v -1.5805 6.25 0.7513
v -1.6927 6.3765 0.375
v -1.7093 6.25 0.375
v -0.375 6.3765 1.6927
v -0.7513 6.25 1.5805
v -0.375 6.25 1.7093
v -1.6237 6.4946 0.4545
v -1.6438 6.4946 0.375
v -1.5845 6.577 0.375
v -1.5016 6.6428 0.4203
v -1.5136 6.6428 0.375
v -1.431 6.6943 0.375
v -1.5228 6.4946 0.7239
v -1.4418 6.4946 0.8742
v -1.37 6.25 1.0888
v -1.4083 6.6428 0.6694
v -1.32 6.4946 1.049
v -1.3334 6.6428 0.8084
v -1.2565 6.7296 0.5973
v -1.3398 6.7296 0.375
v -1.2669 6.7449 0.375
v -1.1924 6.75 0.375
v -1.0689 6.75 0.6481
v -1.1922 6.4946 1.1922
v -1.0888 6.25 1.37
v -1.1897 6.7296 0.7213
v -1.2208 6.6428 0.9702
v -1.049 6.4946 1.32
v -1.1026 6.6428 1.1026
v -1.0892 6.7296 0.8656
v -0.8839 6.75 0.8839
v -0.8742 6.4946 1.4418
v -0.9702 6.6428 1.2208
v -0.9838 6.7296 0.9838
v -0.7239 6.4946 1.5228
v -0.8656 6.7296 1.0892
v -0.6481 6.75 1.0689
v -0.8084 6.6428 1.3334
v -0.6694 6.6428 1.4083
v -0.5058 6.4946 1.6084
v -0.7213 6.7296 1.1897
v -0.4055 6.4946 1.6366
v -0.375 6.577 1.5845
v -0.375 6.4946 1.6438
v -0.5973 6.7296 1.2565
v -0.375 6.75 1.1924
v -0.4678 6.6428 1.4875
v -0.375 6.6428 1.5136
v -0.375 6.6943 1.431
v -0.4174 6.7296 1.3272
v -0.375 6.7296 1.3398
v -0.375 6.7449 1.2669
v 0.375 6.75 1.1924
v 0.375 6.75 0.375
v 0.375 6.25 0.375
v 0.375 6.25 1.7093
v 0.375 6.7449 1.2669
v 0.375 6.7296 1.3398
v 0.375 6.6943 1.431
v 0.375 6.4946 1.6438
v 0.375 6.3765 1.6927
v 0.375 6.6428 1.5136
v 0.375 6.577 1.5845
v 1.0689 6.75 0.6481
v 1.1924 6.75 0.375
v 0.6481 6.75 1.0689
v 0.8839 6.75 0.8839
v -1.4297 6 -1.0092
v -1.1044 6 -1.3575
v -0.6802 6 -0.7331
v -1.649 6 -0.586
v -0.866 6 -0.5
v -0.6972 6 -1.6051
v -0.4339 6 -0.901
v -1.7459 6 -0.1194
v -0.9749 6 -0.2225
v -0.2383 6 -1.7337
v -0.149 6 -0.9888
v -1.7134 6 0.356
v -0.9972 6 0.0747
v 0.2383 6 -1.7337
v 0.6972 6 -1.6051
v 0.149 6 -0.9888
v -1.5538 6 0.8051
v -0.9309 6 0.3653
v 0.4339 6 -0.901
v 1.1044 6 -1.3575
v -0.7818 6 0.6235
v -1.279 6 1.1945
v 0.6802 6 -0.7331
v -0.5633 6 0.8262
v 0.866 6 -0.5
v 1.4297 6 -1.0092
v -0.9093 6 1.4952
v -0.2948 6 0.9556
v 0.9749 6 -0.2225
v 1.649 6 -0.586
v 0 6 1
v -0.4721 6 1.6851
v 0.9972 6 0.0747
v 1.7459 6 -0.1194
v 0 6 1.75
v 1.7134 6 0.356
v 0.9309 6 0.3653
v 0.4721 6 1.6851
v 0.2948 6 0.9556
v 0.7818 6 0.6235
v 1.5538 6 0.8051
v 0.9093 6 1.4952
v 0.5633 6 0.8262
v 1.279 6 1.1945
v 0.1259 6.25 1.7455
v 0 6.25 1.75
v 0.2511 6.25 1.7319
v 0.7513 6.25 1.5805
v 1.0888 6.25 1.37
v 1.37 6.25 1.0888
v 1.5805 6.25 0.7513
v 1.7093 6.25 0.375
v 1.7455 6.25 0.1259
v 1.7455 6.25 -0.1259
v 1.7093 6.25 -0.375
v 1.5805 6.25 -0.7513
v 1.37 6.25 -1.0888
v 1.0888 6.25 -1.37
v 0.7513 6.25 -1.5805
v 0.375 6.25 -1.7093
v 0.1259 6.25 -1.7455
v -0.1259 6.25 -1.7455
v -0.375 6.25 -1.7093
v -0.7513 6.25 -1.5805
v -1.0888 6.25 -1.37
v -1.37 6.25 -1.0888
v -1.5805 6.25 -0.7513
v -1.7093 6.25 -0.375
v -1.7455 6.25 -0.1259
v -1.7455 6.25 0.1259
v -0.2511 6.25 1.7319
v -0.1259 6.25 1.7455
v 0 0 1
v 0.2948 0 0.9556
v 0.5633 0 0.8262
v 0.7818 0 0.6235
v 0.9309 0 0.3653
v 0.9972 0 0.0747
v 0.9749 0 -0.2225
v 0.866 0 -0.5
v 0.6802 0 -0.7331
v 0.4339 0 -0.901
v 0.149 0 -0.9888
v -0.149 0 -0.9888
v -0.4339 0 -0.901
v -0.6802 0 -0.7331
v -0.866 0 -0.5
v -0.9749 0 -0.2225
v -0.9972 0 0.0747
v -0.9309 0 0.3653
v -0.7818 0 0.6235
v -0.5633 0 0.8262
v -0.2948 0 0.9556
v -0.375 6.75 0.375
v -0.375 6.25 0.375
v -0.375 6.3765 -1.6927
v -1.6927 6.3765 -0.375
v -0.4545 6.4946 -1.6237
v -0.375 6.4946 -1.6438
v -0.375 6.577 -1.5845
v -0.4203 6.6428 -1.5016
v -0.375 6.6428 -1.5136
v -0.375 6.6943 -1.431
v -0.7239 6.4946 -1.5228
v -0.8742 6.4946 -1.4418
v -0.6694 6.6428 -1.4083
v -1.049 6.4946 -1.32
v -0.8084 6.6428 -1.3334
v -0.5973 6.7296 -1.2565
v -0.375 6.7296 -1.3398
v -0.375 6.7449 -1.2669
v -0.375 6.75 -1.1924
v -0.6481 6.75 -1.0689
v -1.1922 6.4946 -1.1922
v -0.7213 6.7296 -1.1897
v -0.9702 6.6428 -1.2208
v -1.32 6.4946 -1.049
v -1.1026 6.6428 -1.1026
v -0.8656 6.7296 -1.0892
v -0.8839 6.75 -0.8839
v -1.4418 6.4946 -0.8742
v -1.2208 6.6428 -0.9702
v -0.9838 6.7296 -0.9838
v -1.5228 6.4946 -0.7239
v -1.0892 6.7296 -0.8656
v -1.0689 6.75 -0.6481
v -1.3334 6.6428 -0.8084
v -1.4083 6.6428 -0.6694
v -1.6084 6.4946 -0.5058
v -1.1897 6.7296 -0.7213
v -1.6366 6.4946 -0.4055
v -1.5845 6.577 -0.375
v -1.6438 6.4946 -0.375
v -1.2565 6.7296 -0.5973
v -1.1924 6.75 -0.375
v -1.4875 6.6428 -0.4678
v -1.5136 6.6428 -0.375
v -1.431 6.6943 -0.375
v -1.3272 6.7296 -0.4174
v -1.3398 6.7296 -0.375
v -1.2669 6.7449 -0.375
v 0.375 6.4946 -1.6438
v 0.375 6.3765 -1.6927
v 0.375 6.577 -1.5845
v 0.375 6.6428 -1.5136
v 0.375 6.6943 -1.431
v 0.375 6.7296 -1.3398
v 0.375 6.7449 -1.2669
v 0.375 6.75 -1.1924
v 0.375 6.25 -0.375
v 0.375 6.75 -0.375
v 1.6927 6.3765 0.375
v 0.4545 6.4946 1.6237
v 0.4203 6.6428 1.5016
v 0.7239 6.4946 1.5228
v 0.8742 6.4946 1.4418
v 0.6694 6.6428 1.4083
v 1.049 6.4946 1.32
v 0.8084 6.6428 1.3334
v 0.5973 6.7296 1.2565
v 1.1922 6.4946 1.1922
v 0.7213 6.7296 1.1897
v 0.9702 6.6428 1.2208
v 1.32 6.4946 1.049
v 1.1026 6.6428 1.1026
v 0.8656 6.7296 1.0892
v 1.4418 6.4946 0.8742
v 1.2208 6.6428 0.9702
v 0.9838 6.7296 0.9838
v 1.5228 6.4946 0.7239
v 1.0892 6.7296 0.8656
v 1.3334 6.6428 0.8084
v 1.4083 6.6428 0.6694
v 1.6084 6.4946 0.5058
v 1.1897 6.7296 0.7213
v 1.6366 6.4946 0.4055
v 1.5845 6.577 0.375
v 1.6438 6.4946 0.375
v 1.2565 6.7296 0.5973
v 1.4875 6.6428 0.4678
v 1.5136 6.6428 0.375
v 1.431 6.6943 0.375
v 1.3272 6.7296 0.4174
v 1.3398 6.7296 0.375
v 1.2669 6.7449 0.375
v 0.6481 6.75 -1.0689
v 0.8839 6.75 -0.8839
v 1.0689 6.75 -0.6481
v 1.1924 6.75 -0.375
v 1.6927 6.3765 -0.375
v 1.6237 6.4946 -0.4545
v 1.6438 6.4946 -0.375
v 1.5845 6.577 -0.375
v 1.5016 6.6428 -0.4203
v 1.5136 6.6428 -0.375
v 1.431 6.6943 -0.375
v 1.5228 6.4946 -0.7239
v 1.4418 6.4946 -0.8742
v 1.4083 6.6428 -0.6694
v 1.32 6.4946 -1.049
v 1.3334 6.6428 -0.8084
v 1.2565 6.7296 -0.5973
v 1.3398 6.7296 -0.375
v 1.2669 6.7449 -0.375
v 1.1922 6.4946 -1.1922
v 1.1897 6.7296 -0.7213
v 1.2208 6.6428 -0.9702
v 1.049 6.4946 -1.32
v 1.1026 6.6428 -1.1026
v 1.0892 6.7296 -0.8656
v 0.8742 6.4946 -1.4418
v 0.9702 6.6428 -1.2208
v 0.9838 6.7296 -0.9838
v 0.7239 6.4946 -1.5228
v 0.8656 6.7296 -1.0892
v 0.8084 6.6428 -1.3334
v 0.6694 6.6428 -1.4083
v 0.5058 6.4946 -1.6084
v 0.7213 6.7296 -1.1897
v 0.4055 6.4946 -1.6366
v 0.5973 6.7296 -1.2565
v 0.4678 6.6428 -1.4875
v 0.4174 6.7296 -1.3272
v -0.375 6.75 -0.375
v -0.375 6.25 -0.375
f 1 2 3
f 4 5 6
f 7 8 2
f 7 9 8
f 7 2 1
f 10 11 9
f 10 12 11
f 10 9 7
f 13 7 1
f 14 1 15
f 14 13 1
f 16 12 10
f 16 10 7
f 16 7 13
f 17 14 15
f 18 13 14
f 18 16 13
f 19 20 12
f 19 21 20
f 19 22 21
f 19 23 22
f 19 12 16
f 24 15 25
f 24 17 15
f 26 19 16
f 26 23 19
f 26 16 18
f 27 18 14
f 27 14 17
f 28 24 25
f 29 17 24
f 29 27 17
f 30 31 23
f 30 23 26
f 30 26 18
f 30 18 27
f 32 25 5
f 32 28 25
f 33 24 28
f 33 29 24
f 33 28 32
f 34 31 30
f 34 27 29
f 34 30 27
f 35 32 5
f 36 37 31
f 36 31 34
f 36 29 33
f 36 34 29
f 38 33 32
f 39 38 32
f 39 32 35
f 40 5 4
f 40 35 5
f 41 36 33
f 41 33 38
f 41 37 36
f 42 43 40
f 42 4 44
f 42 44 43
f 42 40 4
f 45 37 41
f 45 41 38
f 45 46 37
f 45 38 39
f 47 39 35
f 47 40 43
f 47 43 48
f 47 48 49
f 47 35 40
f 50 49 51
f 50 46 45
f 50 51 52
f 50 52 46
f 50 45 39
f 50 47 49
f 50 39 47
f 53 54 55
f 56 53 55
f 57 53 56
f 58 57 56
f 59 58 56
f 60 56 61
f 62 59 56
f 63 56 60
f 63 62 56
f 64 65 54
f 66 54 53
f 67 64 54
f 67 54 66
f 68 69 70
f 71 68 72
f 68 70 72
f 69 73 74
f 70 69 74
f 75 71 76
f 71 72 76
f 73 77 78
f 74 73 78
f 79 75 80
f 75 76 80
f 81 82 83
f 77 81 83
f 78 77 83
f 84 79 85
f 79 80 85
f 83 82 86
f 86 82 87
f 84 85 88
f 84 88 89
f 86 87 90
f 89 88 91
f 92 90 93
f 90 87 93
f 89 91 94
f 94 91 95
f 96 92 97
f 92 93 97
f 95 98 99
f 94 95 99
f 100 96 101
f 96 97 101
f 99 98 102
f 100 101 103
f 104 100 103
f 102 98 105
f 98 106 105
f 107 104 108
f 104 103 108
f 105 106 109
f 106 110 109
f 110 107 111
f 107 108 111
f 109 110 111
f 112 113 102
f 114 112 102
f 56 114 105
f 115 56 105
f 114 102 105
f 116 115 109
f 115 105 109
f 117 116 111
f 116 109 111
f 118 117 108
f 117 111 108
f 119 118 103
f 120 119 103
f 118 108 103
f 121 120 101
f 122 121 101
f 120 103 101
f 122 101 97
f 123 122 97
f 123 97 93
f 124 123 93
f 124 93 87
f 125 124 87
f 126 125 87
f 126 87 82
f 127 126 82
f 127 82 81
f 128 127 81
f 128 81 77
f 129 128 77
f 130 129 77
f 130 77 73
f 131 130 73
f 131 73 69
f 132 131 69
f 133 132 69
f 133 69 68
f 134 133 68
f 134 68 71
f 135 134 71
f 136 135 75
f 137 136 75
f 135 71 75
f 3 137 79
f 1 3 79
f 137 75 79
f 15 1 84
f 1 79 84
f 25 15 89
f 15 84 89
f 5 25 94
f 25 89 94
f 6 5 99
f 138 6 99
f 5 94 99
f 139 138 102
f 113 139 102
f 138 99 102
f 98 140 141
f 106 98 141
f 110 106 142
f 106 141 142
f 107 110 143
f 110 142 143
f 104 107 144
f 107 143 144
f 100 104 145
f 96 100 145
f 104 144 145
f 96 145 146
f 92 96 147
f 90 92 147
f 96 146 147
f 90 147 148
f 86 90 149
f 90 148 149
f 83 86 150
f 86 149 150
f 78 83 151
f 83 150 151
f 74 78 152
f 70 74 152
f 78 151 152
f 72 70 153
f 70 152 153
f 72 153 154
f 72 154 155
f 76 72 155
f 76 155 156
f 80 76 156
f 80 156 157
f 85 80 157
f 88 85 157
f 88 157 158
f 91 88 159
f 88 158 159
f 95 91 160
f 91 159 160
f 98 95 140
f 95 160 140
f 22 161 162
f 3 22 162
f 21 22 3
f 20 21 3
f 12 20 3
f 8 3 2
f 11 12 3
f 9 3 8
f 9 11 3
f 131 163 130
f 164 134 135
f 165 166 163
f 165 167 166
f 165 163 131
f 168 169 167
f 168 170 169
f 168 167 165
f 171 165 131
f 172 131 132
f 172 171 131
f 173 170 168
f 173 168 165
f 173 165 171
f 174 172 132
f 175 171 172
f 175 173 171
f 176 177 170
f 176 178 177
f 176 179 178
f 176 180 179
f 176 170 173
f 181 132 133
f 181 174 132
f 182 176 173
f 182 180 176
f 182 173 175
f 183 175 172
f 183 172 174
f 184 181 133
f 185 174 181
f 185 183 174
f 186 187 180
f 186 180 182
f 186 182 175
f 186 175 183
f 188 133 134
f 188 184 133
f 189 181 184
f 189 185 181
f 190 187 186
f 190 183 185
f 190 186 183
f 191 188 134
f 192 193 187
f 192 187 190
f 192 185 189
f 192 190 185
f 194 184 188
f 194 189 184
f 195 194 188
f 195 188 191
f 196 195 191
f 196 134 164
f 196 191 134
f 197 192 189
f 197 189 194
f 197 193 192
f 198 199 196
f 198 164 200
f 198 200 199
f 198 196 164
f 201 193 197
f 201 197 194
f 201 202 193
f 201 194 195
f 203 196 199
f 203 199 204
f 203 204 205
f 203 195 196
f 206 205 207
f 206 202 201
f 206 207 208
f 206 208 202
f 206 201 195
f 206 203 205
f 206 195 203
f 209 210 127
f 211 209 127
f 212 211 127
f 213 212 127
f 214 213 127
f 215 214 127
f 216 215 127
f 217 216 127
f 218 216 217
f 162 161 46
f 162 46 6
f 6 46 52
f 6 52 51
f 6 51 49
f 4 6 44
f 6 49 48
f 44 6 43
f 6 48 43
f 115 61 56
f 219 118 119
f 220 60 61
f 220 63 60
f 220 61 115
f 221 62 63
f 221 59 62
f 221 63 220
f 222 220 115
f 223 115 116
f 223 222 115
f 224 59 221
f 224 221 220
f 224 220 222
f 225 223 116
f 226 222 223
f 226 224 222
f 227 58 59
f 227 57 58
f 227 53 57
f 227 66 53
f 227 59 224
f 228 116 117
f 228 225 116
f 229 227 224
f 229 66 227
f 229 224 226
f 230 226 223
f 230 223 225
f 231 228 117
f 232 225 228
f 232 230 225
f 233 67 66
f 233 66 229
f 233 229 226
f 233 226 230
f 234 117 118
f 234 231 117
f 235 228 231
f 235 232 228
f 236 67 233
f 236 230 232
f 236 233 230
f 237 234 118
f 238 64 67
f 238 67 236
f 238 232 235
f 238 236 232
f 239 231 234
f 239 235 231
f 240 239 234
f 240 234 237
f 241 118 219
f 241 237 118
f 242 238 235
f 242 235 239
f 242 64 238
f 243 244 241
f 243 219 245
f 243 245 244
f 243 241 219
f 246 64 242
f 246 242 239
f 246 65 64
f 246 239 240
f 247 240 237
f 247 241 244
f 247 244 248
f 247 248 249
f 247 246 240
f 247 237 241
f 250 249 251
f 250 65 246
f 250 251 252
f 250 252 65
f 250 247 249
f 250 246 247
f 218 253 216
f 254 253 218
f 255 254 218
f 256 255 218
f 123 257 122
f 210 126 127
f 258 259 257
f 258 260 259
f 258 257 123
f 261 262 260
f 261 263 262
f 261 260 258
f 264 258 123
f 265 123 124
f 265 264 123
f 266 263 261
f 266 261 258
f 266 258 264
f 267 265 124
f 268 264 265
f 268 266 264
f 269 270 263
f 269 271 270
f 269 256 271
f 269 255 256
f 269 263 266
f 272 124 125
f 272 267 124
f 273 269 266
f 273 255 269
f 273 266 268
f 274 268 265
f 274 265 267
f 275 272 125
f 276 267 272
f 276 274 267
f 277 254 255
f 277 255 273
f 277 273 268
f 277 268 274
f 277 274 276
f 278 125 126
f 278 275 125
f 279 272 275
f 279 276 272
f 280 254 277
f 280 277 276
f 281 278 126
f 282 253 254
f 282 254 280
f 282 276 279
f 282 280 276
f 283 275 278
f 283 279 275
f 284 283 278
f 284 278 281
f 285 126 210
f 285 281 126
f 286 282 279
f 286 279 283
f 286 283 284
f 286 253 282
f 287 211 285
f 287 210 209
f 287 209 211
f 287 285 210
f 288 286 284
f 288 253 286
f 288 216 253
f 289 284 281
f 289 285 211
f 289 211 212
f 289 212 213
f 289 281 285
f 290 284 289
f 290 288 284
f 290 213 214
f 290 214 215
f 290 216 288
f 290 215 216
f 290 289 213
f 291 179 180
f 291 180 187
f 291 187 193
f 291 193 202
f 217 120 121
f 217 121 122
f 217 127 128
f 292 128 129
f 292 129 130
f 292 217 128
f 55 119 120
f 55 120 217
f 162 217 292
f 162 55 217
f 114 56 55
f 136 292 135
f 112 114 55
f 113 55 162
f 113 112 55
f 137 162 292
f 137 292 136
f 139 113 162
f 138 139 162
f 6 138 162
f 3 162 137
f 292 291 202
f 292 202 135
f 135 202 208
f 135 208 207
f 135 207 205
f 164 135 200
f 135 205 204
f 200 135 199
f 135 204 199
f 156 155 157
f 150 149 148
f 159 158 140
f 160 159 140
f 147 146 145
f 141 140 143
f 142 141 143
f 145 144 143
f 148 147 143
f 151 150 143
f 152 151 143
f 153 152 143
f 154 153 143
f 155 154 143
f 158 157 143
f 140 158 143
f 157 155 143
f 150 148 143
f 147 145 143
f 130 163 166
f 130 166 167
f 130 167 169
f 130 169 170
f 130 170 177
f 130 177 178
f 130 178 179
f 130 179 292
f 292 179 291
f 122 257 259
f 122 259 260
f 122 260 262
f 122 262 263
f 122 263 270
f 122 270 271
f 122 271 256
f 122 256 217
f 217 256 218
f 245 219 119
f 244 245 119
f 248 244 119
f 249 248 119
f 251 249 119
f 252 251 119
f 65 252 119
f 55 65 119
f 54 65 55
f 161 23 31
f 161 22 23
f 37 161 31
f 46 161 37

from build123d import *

# Parameters (mm, degrees)
SKETCH_1_R          = 1
EXTRUDE_1_DEPTH     = 6
SKETCH_2_R          = 1.75
EXTRUDE_2_DEPTH     = 0.75
FILLET_1_R          = 0.5
SKETCH_3_W          = 7.004697232
SKETCH_3_H          = 0.75
CUT_EXTRUDE_1_DEPTH = 0.5
SKETCH_4_W          = 0.75
SKETCH_4_H          = 3.75
CUT_EXTRUDE_2_DEPTH = 0.5


with BuildPart() as part:
    # 草图1 → 拉伸1 (new body)
    with BuildSketch(Plane(origin=(0, 0, 0), x_dir=(1, 0, 0), z_dir=(0, 1, 0))):
        with Locations(Location((0, 0, 0), (0, 0, 270))):
            Circle(SKETCH_1_R)
    extrude(amount=EXTRUDE_1_DEPTH)

    # 草图2 → 拉伸2 (add)
    with BuildSketch(Plane(origin=(0, 6, 0), x_dir=(-1, 0, 0), z_dir=(0, 1, 0))):
        with Locations(Location((0, 0, 0), (0, 0, 90))):
            Circle(SKETCH_2_R)
    extrude(amount=EXTRUDE_2_DEPTH)

    # 圆角1
    fillet_1_edges = [part.edges().sort_by_distance(p)[0] for p in [
        (0, 6.75, -1.75),
    ]]
    fillet(fillet_1_edges, radius=FILLET_1_R)

    # 草图3 → 切除-拉伸1 (cut)
    with BuildSketch(Plane(origin=(0, 6.75, 0), x_dir=(-1, 0, 0), z_dir=(0, 1, 0))):
        Rectangle(SKETCH_3_W, SKETCH_3_H)
    extrude(amount=-CUT_EXTRUDE_1_DEPTH, mode=Mode.SUBTRACT)

    # 草图4 → 切除-拉伸2 (cut)
    with BuildSketch(Plane(origin=(0, 6.75, 0), x_dir=(-1, 0, 0), z_dir=(0, 1, 0))):
        Rectangle(SKETCH_4_W, SKETCH_4_H)
    extrude(amount=-CUT_EXTRUDE_2_DEPTH, mode=Mode.SUBTRACT)


solid = part.part
